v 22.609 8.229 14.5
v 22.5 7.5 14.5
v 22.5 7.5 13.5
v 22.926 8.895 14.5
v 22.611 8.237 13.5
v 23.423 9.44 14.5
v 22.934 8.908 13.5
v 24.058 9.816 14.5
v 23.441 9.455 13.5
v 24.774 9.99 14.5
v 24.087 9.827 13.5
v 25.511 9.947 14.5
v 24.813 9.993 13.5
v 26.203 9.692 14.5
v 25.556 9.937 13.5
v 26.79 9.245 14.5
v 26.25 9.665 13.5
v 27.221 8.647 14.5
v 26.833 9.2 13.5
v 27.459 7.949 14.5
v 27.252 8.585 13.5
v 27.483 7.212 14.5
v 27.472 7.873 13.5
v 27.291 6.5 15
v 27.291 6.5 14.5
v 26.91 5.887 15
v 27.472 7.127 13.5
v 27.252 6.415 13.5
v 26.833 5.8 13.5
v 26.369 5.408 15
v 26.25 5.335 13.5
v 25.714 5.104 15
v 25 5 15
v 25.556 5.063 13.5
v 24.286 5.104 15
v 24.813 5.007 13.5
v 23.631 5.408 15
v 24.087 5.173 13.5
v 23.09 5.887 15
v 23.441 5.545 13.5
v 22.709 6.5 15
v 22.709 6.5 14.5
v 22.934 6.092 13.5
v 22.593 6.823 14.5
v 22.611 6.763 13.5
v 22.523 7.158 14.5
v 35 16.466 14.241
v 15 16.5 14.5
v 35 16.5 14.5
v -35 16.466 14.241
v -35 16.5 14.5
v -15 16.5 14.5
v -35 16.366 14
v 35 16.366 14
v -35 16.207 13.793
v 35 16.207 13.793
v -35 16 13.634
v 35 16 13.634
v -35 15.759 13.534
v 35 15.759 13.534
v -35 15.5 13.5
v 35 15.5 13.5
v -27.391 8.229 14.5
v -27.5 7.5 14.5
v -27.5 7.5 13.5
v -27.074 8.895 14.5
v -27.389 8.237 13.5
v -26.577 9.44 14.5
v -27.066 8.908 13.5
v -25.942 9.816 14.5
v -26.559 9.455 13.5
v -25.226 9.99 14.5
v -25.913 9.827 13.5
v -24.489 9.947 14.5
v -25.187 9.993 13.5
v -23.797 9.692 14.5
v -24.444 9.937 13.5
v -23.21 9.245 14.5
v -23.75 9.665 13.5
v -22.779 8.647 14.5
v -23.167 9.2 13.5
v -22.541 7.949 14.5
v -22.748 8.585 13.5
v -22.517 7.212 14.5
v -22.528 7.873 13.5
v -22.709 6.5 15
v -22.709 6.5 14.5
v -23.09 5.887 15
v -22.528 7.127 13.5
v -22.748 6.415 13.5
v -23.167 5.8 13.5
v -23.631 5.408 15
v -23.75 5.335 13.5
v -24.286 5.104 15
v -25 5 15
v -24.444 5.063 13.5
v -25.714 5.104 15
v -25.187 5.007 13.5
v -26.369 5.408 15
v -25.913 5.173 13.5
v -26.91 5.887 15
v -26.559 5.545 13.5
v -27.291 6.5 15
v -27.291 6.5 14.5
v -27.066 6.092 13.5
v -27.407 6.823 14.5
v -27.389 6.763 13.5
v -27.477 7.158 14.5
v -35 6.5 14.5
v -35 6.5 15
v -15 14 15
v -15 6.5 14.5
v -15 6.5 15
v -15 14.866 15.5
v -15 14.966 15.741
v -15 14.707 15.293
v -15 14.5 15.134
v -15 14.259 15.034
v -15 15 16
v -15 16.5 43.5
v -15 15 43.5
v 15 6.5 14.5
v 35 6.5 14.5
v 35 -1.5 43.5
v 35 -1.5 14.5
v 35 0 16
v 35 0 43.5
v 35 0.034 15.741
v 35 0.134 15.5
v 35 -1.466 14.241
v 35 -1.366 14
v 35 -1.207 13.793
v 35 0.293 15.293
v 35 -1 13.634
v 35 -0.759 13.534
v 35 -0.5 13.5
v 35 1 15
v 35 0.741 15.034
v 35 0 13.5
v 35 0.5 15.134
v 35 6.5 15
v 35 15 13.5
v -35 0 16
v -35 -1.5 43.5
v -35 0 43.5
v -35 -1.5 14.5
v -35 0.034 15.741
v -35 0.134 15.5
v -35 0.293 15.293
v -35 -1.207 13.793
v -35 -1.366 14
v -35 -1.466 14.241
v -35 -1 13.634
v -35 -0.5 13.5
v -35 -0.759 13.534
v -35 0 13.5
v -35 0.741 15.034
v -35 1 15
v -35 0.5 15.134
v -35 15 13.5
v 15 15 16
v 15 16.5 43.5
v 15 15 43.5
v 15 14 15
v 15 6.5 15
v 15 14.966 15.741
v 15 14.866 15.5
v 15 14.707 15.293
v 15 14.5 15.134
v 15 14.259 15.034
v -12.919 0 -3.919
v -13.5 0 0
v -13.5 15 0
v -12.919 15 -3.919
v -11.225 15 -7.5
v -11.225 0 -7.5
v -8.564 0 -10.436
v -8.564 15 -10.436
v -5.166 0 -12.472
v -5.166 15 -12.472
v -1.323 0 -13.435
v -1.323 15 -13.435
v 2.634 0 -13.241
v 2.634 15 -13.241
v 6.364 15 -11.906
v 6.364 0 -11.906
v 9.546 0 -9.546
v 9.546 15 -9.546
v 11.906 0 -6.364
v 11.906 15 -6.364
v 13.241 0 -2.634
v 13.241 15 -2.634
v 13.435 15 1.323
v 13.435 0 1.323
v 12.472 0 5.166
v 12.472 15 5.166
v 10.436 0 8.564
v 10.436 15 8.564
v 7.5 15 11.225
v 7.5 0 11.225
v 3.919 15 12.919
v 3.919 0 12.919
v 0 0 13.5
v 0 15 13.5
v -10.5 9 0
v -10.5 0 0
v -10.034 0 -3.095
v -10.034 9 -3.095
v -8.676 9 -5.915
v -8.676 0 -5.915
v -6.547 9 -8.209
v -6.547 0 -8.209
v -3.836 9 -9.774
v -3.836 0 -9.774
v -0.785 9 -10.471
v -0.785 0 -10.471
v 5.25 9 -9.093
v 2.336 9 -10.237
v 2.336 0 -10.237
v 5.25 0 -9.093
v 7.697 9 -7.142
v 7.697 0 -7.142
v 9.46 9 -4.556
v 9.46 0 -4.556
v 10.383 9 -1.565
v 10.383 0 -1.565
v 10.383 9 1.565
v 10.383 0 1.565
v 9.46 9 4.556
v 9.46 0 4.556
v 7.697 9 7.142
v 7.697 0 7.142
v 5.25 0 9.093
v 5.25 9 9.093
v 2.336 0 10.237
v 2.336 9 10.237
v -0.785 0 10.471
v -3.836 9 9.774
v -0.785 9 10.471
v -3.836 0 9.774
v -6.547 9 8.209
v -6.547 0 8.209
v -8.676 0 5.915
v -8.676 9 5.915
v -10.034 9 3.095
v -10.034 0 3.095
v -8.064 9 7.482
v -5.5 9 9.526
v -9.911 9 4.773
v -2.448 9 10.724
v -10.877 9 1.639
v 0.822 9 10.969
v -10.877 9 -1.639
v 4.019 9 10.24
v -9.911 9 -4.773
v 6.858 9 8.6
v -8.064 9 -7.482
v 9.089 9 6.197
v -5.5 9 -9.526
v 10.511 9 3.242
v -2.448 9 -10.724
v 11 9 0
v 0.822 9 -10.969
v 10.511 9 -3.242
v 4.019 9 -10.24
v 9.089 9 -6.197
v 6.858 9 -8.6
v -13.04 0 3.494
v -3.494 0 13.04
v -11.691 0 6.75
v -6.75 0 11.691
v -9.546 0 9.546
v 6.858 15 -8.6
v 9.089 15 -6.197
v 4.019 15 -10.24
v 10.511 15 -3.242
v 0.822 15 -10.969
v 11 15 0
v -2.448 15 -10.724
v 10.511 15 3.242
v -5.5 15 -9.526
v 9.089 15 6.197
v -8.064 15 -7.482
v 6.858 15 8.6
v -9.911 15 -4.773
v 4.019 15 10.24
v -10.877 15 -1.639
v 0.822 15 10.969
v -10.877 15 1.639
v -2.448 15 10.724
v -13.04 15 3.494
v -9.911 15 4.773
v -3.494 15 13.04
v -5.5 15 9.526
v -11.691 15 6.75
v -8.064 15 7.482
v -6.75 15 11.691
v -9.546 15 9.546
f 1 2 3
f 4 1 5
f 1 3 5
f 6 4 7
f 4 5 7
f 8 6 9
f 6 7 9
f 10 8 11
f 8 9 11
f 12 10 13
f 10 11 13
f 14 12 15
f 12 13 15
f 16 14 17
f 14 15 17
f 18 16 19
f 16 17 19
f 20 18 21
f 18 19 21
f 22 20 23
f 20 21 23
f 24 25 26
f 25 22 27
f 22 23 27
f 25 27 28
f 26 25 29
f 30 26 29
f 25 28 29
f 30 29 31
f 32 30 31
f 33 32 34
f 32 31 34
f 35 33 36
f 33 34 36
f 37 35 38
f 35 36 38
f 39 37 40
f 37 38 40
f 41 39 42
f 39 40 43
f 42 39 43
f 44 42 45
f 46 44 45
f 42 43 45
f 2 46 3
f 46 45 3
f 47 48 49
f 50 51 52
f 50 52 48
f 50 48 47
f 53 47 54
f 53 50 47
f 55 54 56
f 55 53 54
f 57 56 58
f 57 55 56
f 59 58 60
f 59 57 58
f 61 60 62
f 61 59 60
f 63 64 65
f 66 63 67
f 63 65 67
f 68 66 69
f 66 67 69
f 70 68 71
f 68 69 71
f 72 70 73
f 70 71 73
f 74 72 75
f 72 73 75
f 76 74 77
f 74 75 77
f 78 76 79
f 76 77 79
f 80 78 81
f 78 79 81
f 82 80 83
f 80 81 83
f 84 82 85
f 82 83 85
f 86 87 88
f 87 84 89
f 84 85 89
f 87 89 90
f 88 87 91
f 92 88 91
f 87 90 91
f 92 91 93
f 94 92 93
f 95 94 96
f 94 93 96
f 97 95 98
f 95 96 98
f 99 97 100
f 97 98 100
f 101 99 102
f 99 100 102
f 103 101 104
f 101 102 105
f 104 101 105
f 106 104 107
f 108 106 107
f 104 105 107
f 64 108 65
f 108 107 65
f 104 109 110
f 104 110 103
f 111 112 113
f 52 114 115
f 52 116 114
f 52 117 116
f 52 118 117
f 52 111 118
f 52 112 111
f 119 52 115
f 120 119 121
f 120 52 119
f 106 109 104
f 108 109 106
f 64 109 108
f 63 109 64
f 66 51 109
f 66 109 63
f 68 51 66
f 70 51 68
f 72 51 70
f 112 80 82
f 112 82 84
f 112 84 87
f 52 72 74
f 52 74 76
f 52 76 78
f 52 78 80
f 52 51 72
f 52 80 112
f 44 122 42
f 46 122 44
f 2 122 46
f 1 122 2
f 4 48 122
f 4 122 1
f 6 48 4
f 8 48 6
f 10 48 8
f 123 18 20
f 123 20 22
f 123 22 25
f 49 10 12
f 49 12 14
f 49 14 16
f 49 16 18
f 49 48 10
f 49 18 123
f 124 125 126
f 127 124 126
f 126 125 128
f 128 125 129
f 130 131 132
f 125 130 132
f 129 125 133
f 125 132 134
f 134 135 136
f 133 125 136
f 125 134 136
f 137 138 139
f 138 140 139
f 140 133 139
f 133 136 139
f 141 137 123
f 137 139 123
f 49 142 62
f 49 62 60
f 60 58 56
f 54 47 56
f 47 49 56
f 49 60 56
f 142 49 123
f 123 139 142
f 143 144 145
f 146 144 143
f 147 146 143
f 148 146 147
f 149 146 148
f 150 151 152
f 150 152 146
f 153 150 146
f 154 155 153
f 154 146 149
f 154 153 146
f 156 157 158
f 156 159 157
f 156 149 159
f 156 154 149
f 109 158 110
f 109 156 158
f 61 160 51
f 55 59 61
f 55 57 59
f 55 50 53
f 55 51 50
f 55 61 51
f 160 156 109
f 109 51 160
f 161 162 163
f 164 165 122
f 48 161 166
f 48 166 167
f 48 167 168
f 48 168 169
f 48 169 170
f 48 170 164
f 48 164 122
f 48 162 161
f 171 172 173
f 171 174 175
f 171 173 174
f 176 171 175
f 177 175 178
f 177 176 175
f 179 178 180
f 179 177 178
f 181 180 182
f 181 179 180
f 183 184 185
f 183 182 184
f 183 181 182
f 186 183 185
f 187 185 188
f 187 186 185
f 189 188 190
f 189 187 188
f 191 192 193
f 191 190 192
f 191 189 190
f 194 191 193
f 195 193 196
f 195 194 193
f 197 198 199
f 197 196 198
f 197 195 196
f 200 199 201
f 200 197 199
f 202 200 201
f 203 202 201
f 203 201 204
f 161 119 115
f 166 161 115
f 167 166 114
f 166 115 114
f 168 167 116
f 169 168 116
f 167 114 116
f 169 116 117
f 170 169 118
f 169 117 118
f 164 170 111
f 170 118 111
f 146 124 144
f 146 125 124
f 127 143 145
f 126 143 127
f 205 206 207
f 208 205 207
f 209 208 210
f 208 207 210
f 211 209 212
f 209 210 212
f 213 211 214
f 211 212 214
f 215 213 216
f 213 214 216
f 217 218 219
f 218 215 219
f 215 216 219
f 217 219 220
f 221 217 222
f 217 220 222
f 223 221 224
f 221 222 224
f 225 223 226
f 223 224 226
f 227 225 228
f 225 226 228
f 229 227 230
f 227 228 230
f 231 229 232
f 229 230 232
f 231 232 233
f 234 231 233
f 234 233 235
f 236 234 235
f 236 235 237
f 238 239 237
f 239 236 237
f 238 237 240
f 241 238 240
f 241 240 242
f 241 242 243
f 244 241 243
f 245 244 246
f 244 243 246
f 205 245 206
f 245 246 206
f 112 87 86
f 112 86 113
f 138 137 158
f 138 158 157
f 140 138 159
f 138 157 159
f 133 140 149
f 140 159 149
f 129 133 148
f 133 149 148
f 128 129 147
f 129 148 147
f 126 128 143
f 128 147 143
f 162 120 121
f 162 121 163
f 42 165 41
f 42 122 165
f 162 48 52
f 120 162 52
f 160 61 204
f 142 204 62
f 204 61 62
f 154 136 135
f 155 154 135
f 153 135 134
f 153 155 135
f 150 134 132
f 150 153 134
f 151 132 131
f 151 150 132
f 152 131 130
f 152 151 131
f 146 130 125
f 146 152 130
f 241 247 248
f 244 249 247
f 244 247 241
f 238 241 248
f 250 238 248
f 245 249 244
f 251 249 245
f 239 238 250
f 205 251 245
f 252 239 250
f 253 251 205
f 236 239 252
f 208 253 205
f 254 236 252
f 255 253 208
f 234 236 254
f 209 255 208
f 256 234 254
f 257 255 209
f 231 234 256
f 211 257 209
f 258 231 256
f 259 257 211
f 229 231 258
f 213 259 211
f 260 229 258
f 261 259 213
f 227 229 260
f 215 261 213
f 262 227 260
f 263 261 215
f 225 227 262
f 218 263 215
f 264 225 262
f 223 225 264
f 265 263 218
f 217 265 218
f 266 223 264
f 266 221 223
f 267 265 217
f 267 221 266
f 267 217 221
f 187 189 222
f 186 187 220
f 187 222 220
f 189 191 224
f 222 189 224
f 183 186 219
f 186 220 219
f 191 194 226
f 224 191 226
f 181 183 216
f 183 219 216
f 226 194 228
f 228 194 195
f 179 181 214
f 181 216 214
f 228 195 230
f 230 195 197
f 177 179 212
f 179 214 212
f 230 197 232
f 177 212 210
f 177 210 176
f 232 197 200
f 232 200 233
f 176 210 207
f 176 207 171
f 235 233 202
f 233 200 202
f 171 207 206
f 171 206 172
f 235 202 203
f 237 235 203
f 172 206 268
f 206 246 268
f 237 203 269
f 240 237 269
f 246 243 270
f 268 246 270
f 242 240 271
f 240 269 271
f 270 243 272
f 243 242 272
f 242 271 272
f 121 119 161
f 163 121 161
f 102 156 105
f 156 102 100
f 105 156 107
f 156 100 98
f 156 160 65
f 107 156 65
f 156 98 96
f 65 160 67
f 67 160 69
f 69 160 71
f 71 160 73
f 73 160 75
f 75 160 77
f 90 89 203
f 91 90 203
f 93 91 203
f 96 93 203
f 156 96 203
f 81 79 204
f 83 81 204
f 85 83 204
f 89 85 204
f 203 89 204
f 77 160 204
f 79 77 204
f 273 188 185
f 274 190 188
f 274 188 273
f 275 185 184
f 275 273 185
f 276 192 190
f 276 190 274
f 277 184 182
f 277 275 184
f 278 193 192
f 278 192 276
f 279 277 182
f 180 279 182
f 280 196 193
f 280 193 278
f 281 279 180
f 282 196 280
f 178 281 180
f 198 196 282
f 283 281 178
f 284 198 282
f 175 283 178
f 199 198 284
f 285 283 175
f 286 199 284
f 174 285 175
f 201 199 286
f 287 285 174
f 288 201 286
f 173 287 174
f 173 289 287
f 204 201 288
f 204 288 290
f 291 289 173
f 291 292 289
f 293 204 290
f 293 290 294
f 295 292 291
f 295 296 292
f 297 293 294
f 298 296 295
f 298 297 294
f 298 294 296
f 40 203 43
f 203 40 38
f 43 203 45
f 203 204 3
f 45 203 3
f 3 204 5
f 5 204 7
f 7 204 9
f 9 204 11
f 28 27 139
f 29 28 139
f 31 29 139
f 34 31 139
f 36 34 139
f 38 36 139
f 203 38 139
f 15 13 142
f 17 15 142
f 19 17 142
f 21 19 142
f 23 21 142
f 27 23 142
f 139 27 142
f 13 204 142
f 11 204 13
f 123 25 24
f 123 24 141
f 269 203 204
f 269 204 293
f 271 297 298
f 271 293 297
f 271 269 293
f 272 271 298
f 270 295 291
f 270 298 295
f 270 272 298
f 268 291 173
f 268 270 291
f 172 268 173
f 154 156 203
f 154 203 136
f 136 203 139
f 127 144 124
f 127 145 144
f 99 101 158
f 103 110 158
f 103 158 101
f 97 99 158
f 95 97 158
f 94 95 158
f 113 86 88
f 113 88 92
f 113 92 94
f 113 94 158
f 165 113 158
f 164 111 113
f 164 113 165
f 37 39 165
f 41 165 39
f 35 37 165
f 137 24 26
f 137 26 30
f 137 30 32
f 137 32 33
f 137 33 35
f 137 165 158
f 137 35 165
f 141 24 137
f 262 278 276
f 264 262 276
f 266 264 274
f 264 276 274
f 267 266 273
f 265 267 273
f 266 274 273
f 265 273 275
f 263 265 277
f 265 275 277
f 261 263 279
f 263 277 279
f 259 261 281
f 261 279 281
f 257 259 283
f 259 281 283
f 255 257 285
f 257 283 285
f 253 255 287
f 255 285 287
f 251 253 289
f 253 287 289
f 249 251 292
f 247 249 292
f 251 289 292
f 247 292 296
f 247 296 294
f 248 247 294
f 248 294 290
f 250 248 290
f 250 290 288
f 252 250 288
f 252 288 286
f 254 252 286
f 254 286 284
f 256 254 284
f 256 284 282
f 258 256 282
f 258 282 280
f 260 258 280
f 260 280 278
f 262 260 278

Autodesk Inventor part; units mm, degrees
ref_plane "YZ Plane" through (0, 0, 0) normal (1, 0, 0) x (0, 1, 0)
ref_plane "XZ Plane" through (0, 0, 0) normal (0, 1, 0) x (-1, 0, 0)
ref_plane "XY Plane" through (0, 0, 0) normal (0, 0, 1) x (1, 0, 0)
sketch "Sketch1" plane through (0, 0, 0) normal (0, 1, 0) x (-1, 0, 0)
  circle A0 centre (0, 0) radius 10.5
  circle A1 centre (0, 0) radius 13.5
  dimension "d0" = 21
  dimension "d1" = 3
extrude "Extrusion1" add sketch "Sketch1" along normal blind 15
sketch "Sketch2" plane through (0, 15, 0) normal (0, 1, 0) x (1, 0, 0)
  circle A0 centre (0, 0) radius 11
  circle A1 centre (0, 0) radius 10.5
  dimension "d4" = 22
  dimension "d5" = 21
extrude "Extrusion2" cut sketch "Sketch2" against normal blind 6
sketch "Sketch3" plane through (0, 15, 0) normal (0, 1, 0) x (1, 0, 0)
  line L0 (0, 0) -> (0, -13.5)
  circle A0 centre (0, 0) radius 13.5 projected
ref_plane "Work Plane1" through (0, 15, 13.5) normal (0, 0, 1) x (1, 0, 0)
sketch "Sketch4" plane through (0, 15, 13.5) normal (0, 0, 1) x (1, 0, 0)
  line L0 (0, -15) -> (35, -15)
  line L1 (35, -15) -> (35, 0)
  line L2 (35, 0) -> (0, 0)
  line L3 (0, 0) -> (0, -15)
  line L4 (0, -15) -> (-35, -15)
  line L5 (-35, -15) -> (-35, 0)
  line L6 (-35, 0) -> (0, 0)
  line L7 (0, 0) -> (0, -15)
  line L8 (-35, 0) -> (35, 0)
  line L9 (35, 0) -> (35, 1.5)
  line L10 (35, 1.5) -> (-35, 1.5)
  line L11 (-35, 1.5) -> (-35, 0)
  line L12 (-35, -15) -> (35, -15)
  line L13 (35, -15) -> (35, -16.5)
  line L14 (35, -16.5) -> (-35, -16.5)
  line L15 (-35, -16.5) -> (-35, -15)
  dimension "d8" = 35
  dimension "d9" = 35
  dimension "d10" = 1.5
  dimension "d11" = 1.5
extrude "Extrusion3" add sketch "Sketch4" along normal blind 1.5
extrude "Extrusion4" add sketch "Sketch4" along normal blind 30 contours L0 L13 L14 L15 L4 | L6 L11 L10 L9 L2
fillet "Fillet1" radius 1 4 edges at (0, 15, 15) (0, 0, 15) (0, -1.5, 13.5) (0, 16.5, 13.5)
sketch "Sketch5" plane through (-35, 16.5, 43.5) normal (0, 1, 0) x (1, 0, 0)
  line L0 (0, 29) -> (0, 0) projected
  line L1 (70, 0) -> (0, 0) projected
  line L2 (0, 29) -> (20, 29)
  line L3 (20, 29) -> (20, 0)
  line L4 (20, 0) -> (0, 0)
  line L5 (0, 0) -> (0, 29)
  point P0 (35, 43.5)
  point P1 (70, 28.5)
  dimension "d28" = 20
  dimension "d29" = 29
extrude "Extrusion5" cut sketch "Sketch5" against normal blind 10
sketch "Sketch6" plane through (0, 15, 13.5) normal (0, 0, -1) x (-1, 0, 0)
  circle A0 centre (-25, -7.5) radius 2.5
  circle A1 centre (25, -7.5) radius 2.5
  line L0 (-35, -15.5) -> (-35, 0.5) projected
  line L1 (35, 0.5) -> (35, -15.5) projected
  line L2 (-35, 0) -> (35, 0) projected
  point P0 (0, -15)
  point P1 (-15, 0)
  dimension "d20" = 5
  dimension "d21" = 5
  dimension "d22" = 10
  dimension "d23" = 10
  dimension "d24" = 7.5
extrude "Extrusion6" cut sketch "Sketch6" against normal blind 10
ref_plane "Work Plane2" through (0, 15, 0) normal (1, 0, 0) x (0, 0, 1)
mirror "Mirror1" about plane through (0, 15, 0) normal (1, 0, 0) of "Extrusion5"
equation "\"d11\" = d10"
properties part number "KisCsapagyHaz"
